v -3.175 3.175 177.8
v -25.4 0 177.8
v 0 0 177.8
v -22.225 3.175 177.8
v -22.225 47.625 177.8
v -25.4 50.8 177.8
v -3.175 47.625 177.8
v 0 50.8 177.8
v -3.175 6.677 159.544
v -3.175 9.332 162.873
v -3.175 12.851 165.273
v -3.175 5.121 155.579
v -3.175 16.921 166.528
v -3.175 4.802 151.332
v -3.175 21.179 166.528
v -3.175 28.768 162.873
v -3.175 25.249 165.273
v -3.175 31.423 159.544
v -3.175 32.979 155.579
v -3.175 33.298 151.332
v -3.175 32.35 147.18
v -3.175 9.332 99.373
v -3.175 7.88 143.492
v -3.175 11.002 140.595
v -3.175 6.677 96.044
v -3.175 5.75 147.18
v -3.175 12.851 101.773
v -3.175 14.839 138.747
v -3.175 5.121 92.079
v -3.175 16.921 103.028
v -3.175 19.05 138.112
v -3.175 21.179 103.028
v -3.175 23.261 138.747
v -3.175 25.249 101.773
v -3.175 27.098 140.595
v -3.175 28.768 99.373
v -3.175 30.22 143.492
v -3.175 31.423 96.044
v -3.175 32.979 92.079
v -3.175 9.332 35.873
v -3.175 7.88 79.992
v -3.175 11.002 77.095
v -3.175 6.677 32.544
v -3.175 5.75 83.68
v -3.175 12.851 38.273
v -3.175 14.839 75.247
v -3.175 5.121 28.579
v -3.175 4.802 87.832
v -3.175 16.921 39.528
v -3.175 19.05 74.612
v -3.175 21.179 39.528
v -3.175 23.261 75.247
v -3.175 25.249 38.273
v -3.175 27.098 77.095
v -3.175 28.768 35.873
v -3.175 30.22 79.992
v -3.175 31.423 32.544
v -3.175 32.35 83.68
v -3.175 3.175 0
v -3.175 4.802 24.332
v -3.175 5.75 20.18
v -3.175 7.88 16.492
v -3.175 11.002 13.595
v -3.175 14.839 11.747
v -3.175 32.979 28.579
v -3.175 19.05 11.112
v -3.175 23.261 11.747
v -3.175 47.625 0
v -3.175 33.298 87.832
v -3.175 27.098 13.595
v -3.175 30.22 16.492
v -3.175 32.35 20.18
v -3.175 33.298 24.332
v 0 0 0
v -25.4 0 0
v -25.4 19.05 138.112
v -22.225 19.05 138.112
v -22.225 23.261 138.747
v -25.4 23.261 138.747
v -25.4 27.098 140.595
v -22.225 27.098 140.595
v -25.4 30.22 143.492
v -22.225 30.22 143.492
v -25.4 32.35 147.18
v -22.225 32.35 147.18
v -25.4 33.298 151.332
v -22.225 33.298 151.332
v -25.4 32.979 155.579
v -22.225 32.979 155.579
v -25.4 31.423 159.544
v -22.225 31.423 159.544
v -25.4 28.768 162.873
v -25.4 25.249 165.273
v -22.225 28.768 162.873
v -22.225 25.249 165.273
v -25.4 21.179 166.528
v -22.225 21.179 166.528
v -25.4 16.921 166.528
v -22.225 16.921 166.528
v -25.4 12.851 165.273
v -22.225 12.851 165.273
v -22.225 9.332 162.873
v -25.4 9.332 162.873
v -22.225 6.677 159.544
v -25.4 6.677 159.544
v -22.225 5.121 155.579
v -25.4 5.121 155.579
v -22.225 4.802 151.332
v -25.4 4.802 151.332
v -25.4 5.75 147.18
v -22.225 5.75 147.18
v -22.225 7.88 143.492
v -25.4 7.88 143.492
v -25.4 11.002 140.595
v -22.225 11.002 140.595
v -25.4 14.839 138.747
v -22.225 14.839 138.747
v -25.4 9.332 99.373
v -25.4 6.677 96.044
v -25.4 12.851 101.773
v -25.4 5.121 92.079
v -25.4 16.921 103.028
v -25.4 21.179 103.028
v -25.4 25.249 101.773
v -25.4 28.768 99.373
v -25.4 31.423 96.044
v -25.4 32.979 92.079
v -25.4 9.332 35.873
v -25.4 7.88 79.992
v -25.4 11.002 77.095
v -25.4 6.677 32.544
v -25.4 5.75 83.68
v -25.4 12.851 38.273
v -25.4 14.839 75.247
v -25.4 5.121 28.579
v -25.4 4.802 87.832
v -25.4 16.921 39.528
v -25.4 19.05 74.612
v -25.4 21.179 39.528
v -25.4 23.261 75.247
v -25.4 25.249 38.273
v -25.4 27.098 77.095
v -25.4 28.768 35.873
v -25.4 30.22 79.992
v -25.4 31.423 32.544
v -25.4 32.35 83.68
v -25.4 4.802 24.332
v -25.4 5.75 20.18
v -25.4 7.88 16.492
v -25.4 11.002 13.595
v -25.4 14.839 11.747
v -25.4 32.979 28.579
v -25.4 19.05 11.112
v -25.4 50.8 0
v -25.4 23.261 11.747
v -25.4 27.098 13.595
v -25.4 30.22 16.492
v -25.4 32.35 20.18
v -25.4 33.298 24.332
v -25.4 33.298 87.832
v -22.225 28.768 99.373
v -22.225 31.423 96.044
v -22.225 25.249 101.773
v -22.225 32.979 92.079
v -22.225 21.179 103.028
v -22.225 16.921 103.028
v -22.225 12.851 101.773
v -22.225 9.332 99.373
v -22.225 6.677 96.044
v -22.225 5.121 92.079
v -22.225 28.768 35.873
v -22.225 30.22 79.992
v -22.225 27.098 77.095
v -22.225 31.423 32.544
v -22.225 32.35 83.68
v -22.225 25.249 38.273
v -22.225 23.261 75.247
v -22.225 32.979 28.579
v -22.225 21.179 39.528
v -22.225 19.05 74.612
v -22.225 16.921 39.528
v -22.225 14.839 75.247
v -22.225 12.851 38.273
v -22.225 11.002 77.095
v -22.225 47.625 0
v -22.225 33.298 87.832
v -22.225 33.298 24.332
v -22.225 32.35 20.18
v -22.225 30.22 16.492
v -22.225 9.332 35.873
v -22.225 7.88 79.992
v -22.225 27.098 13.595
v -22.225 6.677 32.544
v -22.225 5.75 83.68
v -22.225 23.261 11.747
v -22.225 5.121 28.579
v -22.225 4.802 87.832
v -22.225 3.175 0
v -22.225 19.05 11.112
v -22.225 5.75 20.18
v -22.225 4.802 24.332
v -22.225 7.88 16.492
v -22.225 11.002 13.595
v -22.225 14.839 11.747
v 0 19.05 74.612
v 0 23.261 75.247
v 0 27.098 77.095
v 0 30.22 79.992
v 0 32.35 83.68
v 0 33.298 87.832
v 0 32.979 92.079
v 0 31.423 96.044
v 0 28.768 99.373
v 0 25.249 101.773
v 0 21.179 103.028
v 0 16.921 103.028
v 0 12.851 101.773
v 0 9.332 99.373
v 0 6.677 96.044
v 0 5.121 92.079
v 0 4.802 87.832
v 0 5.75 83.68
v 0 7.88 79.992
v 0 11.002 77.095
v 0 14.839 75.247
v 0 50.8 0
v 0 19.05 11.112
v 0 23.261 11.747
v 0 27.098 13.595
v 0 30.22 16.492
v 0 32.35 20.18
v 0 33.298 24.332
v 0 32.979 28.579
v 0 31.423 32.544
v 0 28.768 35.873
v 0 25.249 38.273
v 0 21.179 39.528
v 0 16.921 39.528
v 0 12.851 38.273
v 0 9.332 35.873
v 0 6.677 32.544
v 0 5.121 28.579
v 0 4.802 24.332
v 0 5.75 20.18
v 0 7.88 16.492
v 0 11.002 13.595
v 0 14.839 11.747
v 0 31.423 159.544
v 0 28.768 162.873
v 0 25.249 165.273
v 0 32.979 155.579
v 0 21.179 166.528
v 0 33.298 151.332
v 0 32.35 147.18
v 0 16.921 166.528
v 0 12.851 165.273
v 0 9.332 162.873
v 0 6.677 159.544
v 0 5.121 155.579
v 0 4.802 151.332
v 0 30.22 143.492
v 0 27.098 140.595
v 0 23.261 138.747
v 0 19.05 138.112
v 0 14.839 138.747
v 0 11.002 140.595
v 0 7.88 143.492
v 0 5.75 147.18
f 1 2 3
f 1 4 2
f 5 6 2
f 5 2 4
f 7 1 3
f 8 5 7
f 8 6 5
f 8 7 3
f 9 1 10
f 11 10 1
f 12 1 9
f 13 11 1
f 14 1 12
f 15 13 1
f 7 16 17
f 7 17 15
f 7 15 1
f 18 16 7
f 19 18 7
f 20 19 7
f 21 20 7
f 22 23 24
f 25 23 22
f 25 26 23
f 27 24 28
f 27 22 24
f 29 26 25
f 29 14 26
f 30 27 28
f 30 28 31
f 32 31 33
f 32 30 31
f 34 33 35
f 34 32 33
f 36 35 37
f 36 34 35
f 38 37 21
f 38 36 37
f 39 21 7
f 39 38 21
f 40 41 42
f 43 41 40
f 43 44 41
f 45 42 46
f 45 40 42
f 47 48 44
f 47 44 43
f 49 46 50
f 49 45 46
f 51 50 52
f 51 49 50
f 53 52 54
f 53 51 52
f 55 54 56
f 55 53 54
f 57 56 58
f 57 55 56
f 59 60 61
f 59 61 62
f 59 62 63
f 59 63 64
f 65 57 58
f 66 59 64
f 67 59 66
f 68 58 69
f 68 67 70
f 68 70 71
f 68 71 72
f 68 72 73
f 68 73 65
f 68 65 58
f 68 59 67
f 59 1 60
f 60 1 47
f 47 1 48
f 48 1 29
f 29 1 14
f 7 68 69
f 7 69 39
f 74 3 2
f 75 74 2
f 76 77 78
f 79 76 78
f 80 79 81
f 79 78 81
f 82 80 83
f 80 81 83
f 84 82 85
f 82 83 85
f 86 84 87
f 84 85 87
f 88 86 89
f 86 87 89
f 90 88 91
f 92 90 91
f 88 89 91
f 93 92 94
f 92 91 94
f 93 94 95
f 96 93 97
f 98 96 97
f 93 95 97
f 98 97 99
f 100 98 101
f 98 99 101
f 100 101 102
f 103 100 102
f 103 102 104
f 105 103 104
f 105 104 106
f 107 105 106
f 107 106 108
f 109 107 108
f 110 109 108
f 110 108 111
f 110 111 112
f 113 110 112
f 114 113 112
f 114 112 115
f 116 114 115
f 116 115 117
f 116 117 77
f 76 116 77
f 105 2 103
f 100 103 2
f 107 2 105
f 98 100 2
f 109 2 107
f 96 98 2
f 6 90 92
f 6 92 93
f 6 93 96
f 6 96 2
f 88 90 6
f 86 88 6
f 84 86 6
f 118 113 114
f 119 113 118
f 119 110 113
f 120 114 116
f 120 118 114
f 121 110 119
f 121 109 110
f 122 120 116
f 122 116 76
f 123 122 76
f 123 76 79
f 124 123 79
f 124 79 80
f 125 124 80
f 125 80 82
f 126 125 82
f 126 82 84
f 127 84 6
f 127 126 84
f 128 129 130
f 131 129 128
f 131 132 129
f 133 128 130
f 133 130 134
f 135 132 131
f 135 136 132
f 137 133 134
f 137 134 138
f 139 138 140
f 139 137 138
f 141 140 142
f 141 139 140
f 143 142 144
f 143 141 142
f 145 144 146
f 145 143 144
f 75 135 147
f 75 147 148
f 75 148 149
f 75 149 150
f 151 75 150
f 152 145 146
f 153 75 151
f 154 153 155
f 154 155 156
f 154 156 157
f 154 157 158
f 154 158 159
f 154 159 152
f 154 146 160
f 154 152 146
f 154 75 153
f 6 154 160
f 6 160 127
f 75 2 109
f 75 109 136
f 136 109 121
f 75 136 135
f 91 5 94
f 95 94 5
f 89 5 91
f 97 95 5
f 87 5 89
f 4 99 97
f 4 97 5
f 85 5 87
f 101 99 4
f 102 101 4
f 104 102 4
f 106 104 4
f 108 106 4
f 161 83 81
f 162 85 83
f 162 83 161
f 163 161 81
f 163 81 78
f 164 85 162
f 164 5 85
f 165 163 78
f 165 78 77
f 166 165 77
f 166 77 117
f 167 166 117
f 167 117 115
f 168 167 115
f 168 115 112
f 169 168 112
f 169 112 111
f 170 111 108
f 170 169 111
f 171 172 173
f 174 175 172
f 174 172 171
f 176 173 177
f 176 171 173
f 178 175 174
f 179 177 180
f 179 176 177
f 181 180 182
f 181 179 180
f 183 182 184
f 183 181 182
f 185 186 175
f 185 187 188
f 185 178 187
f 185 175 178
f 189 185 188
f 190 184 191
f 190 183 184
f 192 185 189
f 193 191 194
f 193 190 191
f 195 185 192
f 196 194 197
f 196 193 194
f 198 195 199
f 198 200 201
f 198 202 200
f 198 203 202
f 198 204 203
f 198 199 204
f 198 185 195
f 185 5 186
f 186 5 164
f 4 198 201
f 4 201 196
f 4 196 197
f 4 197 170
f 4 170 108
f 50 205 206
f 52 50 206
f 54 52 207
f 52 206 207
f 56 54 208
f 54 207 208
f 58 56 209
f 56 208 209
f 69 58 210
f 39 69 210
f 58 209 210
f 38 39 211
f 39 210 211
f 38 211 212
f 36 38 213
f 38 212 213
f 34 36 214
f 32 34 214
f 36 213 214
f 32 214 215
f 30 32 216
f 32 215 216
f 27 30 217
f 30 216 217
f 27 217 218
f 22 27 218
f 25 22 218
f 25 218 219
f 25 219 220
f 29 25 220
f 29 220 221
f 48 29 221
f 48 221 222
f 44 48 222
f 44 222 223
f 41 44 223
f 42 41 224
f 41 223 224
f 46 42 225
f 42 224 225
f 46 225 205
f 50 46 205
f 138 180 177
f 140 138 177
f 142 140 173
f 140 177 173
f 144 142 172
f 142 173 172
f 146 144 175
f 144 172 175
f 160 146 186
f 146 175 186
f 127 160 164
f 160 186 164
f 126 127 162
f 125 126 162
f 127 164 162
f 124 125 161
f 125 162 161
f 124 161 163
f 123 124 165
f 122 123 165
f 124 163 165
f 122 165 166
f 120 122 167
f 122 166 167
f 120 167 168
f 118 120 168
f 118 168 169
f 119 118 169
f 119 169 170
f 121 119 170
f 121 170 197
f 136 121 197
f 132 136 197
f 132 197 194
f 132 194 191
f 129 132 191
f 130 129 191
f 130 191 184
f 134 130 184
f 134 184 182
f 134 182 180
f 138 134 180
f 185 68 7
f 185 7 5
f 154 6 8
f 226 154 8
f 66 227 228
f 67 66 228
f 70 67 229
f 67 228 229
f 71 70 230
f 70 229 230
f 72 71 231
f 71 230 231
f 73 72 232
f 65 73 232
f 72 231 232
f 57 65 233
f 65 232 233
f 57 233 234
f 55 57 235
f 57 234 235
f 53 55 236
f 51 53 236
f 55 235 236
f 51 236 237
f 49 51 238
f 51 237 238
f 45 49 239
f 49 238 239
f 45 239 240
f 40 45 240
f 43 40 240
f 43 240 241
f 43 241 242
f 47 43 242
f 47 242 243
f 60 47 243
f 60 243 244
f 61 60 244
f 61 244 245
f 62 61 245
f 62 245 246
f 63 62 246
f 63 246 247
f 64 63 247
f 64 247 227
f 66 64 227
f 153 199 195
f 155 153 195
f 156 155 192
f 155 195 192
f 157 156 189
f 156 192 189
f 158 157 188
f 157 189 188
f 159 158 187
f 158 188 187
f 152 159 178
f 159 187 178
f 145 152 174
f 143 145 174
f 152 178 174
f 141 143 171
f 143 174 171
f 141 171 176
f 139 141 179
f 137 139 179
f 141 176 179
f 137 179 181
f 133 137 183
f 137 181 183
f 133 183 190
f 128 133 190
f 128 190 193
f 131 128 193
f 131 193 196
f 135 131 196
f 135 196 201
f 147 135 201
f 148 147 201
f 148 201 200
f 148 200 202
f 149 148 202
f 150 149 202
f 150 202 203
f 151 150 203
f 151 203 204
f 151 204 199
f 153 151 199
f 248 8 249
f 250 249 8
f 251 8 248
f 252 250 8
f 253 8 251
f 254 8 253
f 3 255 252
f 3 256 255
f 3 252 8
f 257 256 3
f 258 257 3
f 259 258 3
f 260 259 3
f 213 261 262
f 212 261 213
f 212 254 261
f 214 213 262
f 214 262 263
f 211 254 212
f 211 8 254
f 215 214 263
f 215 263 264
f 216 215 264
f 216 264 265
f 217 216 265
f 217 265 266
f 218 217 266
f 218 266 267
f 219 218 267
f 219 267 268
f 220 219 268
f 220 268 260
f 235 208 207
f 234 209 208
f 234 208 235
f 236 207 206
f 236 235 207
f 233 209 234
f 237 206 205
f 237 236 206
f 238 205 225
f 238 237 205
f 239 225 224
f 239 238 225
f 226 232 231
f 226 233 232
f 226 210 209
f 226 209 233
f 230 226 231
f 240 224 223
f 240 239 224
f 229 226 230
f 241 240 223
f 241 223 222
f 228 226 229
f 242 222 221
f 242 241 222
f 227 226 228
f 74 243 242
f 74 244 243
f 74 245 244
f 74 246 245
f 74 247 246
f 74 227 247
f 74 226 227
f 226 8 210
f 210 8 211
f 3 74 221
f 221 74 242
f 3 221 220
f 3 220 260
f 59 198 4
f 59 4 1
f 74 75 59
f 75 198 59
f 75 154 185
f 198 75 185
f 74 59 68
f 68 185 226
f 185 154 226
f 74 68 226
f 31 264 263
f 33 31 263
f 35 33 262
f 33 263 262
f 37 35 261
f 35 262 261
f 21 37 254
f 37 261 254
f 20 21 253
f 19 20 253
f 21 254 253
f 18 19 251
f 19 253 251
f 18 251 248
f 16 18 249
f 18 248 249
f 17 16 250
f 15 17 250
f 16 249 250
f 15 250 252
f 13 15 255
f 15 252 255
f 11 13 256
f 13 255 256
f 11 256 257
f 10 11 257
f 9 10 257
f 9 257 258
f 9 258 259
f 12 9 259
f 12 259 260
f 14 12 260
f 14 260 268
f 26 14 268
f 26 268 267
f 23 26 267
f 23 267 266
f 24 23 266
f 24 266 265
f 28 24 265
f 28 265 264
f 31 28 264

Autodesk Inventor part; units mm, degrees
ref_plane "YZ Plane" through (0, 0, 0) normal (1, 0, 0) x (0, 1, 0)
ref_plane "XZ Plane" through (0, 0, 0) normal (0, 1, 0) x (-1, 0, 0)
ref_plane "XY Plane" through (0, 0, 0) normal (0, 0, 1) x (1, 0, 0)
sketch "Sketch1" plane through (0, 0, 0) normal (0, 0, 1) x (1, 0, 0)
  line L0 (0, 0) -> (-25.4, 0)
  line L1 (-25.4, 0) -> (-25.4, 50.8)
  line L2 (-25.4, 50.8) -> (0, 50.8)
  line L3 (0, 50.8) -> (0, 0)
  line L4 (-22.225, 3.175) -> (-3.175, 3.175)
  line L5 (-3.175, 3.175) -> (-3.175, 47.625)
  line L6 (-3.175, 47.625) -> (-22.225, 47.625)
  line L7 (-22.225, 47.625) -> (-22.225, 3.175)
  dimension "d0" = 25.4
  dimension "d1" = 50.8
  dimension "d2" = 3.175
extrude "Extrusion1" add sketch "Sketch1" along normal blind 177.8
sketch "Sketch2" plane through (0, 0, 0) normal (1, 0, 0) x (0, 0, -1)
  circle A0 centre (-152.4, 19.05) radius 14.2875
  circle A1 centre (-25.4, 19.05) radius 14.2875
  circle A2 centre (-88.9, 19.05) radius 14.2875
  line L0 (-177.8, 0) -> (-177.8, 50.8) projected
  line L1 (0, 50.8) -> (0, 0) projected
  line L2 (0, 50.8) -> (-177.8, 50.8) projected
  line L3 (0, 0) -> (-177.8, 0) projected
  dimension "d5" = 28.575
  dimension "d6" = 28.575
  dimension "d7" = 28.575
  dimension "d8" = 25.4
  dimension "d9" = 25.4
  dimension "d10" = 31.75
  dimension "d11" = 31.75
  dimension "d12" = 19.05
  dimension "a" = 63.5
  dimension "d14" = 63.5
extrude "Extrusion2" cut sketch "Sketch2" against normal blind 209.3722 contours A0 | A1 | A2
properties part number "Clamp Arms"
